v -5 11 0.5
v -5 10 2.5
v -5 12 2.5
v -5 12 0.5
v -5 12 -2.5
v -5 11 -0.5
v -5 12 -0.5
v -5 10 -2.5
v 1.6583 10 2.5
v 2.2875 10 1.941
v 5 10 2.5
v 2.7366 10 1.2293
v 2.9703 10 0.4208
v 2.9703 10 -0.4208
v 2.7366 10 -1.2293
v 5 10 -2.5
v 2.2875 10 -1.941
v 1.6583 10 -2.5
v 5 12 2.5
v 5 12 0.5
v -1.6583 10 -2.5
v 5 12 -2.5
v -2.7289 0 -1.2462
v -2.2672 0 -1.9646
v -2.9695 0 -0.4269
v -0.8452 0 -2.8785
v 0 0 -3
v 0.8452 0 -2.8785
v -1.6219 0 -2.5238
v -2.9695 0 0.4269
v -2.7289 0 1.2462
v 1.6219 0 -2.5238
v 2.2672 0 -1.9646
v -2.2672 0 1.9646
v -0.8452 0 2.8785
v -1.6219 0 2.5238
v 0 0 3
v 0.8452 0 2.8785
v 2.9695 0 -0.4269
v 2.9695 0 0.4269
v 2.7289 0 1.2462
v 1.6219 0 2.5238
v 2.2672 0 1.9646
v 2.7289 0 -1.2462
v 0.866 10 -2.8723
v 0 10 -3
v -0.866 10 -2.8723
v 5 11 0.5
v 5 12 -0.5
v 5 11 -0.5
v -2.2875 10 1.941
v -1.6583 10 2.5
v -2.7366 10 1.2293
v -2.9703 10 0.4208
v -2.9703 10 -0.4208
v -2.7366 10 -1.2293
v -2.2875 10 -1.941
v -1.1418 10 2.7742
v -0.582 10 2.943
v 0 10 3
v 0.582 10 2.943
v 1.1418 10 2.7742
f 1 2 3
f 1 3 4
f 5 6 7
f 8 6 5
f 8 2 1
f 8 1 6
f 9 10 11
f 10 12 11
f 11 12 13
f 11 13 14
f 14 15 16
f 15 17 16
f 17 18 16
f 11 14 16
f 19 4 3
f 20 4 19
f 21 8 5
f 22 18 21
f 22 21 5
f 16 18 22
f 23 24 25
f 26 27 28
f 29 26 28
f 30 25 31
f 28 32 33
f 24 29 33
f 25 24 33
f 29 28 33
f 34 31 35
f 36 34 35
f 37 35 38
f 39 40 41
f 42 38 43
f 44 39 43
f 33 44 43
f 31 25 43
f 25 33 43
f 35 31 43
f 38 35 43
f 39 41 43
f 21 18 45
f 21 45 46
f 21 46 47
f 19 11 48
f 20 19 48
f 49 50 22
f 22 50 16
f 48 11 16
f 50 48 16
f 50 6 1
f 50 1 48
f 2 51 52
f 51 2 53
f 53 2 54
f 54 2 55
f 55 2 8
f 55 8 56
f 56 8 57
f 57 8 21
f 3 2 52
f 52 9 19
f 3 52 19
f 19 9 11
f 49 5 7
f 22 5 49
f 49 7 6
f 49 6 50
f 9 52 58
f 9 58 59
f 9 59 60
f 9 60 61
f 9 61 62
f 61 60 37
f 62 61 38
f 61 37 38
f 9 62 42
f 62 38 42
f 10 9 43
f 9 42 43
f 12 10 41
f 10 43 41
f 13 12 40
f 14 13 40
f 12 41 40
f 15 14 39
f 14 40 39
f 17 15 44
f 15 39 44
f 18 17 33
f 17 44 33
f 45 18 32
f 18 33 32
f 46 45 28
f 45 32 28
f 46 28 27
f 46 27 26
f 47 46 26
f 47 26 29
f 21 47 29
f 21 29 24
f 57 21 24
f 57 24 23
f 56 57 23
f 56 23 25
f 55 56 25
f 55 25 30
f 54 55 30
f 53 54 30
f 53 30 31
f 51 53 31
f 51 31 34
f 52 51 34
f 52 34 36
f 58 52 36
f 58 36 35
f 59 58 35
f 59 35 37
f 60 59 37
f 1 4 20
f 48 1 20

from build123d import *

# Parameters (mm, degrees)
SKETCH1_R           = 3
BOSS_EXTRUDE1_DEPTH = 10
SKETCH2_W           = 10
SKETCH2_H           = 5
BOSS_EXTRUDE2_DEPTH = 2
SKETCH3_W           = 10
SKETCH3_H           = 1
CUT_EXTRUDE1_DEPTH  = 1


with BuildPart() as part:
    # Sketch1 → Boss-Extrude1 (new body)
    with BuildSketch(Plane(origin=(0, 0, 0), x_dir=(1, 0, 0), z_dir=(0, 1, 0))):
        with Locations(Location((0, 0, 0), (0, 0, 270))):
            Circle(SKETCH1_R)
    extrude(amount=BOSS_EXTRUDE1_DEPTH)

    # Sketch2 → Boss-Extrude2 (add)
    with BuildSketch(Plane(origin=(0, 10, 0), x_dir=(1, 0, 0), z_dir=(0, 1, 0))):
        Rectangle(SKETCH2_W, SKETCH2_H)
    extrude(amount=BOSS_EXTRUDE2_DEPTH)

    # Sketch3 → Cut-Extrude1 (cut)
    with BuildSketch(Plane(origin=(0, 12, 0), x_dir=(1, 0, 0), z_dir=(0, 1, 0))):
        Rectangle(SKETCH3_W, SKETCH3_H)
    extrude(amount=-CUT_EXTRUDE1_DEPTH, mode=Mode.SUBTRACT)


solid = part.part
